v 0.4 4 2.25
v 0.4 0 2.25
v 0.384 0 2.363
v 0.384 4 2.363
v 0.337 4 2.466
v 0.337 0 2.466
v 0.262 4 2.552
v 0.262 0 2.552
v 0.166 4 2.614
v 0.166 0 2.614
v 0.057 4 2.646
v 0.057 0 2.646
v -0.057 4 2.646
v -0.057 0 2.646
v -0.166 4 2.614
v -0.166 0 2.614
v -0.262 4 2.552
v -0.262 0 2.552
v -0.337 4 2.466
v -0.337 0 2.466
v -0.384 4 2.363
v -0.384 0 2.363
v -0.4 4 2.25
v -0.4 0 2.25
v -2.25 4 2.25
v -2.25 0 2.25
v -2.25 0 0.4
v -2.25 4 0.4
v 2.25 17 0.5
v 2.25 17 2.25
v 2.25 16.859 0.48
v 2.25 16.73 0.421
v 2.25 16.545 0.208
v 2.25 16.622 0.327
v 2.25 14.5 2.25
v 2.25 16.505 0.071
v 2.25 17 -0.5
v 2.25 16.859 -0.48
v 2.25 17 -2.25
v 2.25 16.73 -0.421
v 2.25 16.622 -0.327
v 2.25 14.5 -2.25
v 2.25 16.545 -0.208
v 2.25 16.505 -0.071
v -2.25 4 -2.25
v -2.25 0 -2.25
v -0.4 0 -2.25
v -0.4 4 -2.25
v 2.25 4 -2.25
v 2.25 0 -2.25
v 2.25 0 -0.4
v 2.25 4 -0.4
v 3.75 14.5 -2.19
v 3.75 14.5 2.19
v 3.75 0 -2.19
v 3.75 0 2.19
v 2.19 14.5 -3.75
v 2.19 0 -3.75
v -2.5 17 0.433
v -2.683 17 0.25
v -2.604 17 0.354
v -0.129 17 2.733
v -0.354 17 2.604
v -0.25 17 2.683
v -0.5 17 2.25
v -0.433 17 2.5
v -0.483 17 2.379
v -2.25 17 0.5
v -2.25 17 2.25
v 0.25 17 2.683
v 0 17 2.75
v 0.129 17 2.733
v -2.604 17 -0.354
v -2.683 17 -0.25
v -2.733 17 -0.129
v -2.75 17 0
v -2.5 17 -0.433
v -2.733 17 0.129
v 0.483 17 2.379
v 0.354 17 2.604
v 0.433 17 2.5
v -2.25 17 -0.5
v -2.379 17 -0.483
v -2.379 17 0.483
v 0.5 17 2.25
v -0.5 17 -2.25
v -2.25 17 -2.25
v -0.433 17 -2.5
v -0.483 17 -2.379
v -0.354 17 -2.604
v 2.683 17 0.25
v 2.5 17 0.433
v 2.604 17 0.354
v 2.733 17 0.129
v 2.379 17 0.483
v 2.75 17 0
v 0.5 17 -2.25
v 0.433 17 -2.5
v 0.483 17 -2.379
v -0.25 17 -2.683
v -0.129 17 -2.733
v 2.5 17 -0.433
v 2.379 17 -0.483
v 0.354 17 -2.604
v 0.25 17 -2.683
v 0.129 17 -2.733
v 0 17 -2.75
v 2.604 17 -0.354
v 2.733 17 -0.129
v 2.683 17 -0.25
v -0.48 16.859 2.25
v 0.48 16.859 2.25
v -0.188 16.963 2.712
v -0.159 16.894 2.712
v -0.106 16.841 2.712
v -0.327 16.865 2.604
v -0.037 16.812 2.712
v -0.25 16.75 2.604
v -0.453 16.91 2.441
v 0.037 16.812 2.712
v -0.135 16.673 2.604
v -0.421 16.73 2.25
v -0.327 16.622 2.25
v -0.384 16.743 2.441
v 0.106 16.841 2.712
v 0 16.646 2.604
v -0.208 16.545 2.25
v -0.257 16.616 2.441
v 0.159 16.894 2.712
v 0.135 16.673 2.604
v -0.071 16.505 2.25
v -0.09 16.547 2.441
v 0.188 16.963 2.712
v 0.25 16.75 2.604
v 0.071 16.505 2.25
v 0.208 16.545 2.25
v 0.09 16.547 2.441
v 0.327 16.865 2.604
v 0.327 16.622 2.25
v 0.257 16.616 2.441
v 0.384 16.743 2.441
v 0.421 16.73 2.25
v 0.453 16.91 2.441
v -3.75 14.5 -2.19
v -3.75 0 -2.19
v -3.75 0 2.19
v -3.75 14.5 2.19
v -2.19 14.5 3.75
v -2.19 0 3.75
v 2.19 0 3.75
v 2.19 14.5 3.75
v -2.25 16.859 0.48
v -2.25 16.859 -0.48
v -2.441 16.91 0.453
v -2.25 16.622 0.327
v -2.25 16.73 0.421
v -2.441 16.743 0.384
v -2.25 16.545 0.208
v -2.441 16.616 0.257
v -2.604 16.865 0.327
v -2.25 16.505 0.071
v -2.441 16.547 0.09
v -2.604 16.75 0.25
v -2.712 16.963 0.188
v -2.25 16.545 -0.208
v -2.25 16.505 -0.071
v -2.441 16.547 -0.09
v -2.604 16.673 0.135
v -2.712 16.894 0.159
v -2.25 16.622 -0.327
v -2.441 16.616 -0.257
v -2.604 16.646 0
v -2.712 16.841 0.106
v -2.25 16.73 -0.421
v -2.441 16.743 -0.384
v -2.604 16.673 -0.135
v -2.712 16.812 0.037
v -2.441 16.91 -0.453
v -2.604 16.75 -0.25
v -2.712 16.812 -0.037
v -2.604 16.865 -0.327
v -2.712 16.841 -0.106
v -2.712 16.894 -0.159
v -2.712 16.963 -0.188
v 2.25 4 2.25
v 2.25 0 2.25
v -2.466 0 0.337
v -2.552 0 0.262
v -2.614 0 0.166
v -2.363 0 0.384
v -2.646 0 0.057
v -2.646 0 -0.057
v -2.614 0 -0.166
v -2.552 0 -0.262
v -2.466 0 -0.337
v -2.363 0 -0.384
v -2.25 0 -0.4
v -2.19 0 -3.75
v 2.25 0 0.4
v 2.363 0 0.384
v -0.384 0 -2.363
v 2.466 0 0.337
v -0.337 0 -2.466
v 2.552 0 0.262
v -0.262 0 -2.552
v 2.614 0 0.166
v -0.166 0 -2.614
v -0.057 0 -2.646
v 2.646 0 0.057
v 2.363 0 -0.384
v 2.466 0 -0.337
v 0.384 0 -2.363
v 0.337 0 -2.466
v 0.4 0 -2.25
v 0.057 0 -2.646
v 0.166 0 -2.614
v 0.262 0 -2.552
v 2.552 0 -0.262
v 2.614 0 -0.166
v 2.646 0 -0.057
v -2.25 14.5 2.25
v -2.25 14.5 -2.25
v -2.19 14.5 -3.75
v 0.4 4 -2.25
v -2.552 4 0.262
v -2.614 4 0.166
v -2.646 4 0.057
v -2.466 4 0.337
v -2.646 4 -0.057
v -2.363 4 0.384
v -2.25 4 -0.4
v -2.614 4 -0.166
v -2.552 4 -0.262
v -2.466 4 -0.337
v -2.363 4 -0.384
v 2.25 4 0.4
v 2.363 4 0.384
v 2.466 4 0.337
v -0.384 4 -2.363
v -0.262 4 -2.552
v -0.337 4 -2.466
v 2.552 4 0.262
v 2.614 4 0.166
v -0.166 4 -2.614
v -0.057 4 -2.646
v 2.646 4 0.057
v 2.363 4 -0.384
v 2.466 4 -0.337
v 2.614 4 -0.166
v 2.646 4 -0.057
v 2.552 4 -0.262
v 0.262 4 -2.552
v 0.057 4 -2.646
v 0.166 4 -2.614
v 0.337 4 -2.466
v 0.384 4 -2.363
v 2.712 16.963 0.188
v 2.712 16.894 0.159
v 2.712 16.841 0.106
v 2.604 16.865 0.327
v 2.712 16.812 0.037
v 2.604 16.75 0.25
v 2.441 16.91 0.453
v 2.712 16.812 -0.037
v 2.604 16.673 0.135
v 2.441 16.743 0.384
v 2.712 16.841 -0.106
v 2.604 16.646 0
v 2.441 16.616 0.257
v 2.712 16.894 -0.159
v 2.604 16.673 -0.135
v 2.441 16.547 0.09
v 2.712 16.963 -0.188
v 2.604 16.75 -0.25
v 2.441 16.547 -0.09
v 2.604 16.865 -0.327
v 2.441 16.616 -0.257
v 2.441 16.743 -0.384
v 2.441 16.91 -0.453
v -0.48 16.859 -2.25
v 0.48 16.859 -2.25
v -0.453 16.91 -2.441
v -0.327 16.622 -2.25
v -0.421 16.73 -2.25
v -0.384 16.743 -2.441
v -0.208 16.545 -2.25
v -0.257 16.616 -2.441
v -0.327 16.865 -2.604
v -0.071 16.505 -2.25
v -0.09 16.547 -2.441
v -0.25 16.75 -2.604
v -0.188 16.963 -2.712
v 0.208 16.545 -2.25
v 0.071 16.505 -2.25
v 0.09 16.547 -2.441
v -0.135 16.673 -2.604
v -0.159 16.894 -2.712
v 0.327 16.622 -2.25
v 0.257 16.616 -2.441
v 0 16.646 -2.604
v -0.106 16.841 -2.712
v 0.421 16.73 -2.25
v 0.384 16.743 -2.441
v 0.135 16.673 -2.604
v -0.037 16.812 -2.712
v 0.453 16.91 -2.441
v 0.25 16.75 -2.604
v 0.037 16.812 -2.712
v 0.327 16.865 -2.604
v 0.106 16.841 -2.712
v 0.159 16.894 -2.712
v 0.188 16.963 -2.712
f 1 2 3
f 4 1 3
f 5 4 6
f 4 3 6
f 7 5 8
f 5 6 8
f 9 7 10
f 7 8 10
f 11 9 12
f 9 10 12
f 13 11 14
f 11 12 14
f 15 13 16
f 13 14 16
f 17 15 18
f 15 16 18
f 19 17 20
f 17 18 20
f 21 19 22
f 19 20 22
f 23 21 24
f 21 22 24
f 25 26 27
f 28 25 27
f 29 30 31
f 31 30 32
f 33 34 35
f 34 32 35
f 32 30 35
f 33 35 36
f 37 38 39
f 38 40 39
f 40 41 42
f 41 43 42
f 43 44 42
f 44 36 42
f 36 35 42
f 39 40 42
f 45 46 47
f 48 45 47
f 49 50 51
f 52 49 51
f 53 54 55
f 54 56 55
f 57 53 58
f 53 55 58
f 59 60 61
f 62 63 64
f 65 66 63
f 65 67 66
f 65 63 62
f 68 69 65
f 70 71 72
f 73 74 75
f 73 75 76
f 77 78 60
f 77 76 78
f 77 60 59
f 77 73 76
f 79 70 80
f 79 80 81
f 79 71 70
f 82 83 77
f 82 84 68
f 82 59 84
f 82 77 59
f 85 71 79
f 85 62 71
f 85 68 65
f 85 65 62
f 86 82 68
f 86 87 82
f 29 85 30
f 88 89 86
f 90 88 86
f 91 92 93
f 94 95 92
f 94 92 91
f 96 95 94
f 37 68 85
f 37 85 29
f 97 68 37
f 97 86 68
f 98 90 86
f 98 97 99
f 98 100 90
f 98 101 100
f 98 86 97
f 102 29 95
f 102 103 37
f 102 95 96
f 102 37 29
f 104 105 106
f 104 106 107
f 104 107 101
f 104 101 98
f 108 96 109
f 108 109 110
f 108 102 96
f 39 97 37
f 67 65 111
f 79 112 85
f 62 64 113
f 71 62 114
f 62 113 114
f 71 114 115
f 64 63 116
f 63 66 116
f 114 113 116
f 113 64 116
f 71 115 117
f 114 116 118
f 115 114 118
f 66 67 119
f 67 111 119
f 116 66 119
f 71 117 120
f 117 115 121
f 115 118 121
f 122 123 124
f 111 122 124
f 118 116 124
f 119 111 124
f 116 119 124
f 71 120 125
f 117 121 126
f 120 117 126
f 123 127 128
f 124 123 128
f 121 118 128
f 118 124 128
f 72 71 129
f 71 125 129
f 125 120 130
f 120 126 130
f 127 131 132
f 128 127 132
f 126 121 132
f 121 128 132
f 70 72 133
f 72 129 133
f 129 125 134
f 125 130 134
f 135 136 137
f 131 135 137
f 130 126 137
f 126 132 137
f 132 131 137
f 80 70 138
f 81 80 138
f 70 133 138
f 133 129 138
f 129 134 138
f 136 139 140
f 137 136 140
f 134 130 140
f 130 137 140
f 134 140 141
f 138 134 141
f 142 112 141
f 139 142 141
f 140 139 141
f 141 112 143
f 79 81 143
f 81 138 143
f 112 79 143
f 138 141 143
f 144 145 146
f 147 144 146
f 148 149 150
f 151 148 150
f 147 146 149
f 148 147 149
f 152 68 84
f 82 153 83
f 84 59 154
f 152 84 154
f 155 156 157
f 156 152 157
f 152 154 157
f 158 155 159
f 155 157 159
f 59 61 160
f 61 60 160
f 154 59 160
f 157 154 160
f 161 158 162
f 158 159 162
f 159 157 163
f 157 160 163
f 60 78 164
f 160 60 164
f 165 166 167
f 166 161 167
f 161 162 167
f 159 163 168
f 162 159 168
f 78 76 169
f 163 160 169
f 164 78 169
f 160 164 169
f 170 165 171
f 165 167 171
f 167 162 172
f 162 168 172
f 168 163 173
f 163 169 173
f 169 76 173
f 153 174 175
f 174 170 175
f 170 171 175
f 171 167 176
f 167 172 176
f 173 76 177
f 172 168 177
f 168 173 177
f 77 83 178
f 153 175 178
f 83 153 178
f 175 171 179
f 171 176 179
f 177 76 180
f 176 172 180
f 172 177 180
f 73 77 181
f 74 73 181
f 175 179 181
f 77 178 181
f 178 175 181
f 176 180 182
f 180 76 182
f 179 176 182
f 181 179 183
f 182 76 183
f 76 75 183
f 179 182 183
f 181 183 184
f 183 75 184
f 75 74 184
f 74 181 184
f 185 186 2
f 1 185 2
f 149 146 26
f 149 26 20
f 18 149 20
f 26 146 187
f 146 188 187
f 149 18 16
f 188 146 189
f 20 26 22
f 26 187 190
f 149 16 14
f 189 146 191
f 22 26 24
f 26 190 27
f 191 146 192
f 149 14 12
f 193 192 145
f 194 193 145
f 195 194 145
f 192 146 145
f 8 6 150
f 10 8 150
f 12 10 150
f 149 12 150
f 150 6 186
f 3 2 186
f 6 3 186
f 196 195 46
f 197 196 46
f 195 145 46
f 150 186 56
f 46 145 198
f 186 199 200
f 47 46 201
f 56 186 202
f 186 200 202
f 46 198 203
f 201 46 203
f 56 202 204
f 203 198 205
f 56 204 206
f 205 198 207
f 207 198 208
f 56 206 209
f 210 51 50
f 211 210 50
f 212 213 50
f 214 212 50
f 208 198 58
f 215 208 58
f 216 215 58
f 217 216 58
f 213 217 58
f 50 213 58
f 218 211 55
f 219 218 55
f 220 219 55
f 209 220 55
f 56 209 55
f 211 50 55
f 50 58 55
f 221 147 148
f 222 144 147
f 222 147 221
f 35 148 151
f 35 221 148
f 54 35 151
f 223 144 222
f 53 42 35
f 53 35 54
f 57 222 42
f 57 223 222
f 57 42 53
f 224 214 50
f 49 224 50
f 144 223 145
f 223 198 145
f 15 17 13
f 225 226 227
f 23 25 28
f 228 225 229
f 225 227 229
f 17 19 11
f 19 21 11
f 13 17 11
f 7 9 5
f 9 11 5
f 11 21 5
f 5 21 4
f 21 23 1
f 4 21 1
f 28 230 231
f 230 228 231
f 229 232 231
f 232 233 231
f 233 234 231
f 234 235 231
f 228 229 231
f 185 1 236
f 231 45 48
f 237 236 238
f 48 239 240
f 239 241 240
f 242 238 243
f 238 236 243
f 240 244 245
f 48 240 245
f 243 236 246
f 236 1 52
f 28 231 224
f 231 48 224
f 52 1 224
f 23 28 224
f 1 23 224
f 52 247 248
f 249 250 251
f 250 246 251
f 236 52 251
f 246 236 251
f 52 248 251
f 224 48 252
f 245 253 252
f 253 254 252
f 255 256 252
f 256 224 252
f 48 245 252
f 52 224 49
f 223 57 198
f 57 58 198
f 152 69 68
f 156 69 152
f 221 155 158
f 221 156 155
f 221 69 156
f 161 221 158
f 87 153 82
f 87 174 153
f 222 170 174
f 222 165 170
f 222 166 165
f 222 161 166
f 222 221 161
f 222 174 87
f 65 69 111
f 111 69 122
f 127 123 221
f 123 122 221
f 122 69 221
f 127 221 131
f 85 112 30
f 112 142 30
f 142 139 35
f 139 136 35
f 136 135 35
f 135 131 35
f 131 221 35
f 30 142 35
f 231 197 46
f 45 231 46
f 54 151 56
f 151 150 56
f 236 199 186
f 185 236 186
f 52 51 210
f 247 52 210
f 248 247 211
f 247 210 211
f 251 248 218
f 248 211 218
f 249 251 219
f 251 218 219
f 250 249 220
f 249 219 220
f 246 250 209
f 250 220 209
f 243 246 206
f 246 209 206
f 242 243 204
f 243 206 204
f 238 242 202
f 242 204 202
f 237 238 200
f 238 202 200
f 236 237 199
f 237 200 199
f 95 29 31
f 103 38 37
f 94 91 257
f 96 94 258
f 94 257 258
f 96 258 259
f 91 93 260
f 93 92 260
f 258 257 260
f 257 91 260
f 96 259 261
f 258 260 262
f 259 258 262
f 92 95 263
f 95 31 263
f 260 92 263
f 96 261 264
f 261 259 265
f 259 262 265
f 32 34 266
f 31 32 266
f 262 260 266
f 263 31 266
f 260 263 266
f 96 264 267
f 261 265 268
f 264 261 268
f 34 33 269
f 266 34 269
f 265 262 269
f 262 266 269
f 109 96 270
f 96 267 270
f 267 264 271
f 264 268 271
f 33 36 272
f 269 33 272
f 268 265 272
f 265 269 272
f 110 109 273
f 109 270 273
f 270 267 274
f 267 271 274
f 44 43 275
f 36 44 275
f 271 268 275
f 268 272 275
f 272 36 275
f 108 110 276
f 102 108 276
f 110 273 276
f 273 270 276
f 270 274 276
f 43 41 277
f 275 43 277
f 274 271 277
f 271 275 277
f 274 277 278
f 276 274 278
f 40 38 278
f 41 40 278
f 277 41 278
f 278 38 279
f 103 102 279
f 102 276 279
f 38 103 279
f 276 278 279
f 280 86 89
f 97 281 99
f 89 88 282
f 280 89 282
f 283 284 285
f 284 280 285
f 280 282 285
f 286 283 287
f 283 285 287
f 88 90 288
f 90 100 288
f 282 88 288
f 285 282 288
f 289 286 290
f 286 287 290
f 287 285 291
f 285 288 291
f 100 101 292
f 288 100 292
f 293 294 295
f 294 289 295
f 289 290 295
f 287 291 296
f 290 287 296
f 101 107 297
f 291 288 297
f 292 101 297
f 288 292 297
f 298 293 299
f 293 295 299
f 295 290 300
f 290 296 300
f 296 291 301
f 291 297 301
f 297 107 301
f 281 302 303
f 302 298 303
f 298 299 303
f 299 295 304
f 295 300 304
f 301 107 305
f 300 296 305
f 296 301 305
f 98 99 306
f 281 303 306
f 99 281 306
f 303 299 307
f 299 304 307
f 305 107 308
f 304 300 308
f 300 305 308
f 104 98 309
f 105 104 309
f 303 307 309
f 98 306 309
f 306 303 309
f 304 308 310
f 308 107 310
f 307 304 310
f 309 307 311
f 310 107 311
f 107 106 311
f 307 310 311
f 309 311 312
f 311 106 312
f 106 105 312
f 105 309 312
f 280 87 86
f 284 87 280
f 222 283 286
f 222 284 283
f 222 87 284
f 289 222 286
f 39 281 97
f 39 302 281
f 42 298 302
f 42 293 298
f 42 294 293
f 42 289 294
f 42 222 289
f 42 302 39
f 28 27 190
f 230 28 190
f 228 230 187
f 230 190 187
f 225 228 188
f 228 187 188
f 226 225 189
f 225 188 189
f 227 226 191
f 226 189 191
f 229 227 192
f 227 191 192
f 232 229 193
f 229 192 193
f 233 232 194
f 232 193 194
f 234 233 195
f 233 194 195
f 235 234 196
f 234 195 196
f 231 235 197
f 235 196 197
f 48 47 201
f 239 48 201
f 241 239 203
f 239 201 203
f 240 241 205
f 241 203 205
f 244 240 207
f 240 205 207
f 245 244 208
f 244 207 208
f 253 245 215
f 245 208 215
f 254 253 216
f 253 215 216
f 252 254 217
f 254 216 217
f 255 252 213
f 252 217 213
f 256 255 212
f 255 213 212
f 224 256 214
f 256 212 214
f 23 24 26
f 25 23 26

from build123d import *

# Parameters (mm, degrees)
EXTRUDE_1_DEPTH     = 4
EXTRUDE_2_DEPTH     = 10.5
SKETCH_3_W          = 4.5
SKETCH_3_H          = 4.5
EXTRUDE_3_DEPTH     = 2.5
SKETCH_6_W          = 5.635445318
SKETCH_6_H          = 5.939696962
CUT_EXTRUDE_2_DEPTH = 2.5


with BuildPart() as part:
    # 草图1 → 凸台-拉伸1 (new body)
    with BuildSketch(Plane(origin=(0, 0, 0), x_dir=(1, 0, 0), z_dir=(0, 1, 0))):
        Polygon((2.189696962, -3.75), (3.75, -2.189696962), (3.75, 2.189696962), (2.189696962, 3.75), (-2.189696962, 3.75), (-3.75, 2.189696962), (-3.75, -2.189696962), (-2.189696962, -3.75), align=None)
        with BuildLine():
            Line((2.25, -0.4), (2.25, -2.25))
            Line((2.25, -2.25), (0.4, -2.25))
            ThreePointArc((0.4, -2.25), (0, -2.65), (-0.4, -2.25))
            Line((-0.4, -2.25), (-2.25, -2.25))
            Line((-2.25, -2.25), (-2.25, -0.4))
            ThreePointArc((-2.25, -0.4), (-2.65, 0), (-2.25, 0.4))
            Line((-2.25, 0.4), (-2.25, 2.25))
            Line((-2.25, 2.25), (-0.4, 2.25))
            ThreePointArc((-0.4, 2.25), (0, 2.65), (0.4, 2.25))
            Line((0.4, 2.25), (2.25, 2.25))
            Line((2.25, 2.25), (2.25, 0.4))
            ThreePointArc((2.25, 0.4), (2.65, 0), (2.25, -0.4))
        make_face(mode=Mode.SUBTRACT)
    extrude(amount=EXTRUDE_1_DEPTH)

    # 草图2 → 凸台-拉伸2 (add)
    with BuildSketch(Plane(origin=(0, 4, 0), x_dir=(1, 0, 0), z_dir=(0, 1, 0))):
        Polygon((-2.189696962, -3.75), (2.189696962, -3.75), (3.75, -2.189696962), (3.75, 2.189696962), (2.189696962, 3.75), (-2.189696962, 3.75), (-3.75, 2.189696962), (-3.75, -2.189696962), align=None)
    extrude(amount=EXTRUDE_2_DEPTH)

    # 草图3 → 凸台-拉伸3 (add)
    with BuildSketch(Plane(origin=(0, 14.5, 0), x_dir=(1, 0, 0), z_dir=(0, 1, 0))):
        Rectangle(SKETCH_3_W, SKETCH_3_H)
    extrude(amount=EXTRUDE_3_DEPTH)

    # 草图4 → 旋转1 (revolve)
    with BuildSketch(Plane(origin=(0, 17, 0), x_dir=(1, 0, 0), z_dir=(0, 1, 0))):
        with BuildLine():
            Line((0, 2.75), (0, 1.75))
            ThreePointArc((0, 1.75), (-0.5, 2.25), (0, 2.75))
        make_face()
        with BuildLine():
            Line((0, -1.75), (0, -2.75))
            ThreePointArc((0, -2.75), (-0.5, -2.25), (0, -1.75))
        make_face()
    revolve(axis=Axis((0, 17, -2.75), (0, 0, 1)))

    # 草图5 → 旋转2 (revolve)
    with BuildSketch(Plane(origin=(0, 17, 0), x_dir=(1, 0, 0), z_dir=(0, 1, 0))):
        with BuildLine():
            Line((-2.75, 0), (-1.75, 0))
            ThreePointArc((-1.75, 0), (-2.25, -0.5), (-2.75, 0))
        make_face()
        with BuildLine():
            Line((1.75, 0), (2.75, 0))
            ThreePointArc((2.75, 0), (2.25, -0.5), (1.75, 0))
        make_face()
    revolve(axis=Axis((-2.75, 17, 0), (1, 0, 0)))

    # 草图6 → 切除-拉伸2 (cut)
    with BuildSketch(Plane(origin=(0, 17, 0), x_dir=(1, 0, 0), z_dir=(0, 1, 0))):
        Rectangle(SKETCH_6_W, SKETCH_6_H)
    extrude(amount=CUT_EXTRUDE_2_DEPTH, mode=Mode.SUBTRACT)


solid = part.part
